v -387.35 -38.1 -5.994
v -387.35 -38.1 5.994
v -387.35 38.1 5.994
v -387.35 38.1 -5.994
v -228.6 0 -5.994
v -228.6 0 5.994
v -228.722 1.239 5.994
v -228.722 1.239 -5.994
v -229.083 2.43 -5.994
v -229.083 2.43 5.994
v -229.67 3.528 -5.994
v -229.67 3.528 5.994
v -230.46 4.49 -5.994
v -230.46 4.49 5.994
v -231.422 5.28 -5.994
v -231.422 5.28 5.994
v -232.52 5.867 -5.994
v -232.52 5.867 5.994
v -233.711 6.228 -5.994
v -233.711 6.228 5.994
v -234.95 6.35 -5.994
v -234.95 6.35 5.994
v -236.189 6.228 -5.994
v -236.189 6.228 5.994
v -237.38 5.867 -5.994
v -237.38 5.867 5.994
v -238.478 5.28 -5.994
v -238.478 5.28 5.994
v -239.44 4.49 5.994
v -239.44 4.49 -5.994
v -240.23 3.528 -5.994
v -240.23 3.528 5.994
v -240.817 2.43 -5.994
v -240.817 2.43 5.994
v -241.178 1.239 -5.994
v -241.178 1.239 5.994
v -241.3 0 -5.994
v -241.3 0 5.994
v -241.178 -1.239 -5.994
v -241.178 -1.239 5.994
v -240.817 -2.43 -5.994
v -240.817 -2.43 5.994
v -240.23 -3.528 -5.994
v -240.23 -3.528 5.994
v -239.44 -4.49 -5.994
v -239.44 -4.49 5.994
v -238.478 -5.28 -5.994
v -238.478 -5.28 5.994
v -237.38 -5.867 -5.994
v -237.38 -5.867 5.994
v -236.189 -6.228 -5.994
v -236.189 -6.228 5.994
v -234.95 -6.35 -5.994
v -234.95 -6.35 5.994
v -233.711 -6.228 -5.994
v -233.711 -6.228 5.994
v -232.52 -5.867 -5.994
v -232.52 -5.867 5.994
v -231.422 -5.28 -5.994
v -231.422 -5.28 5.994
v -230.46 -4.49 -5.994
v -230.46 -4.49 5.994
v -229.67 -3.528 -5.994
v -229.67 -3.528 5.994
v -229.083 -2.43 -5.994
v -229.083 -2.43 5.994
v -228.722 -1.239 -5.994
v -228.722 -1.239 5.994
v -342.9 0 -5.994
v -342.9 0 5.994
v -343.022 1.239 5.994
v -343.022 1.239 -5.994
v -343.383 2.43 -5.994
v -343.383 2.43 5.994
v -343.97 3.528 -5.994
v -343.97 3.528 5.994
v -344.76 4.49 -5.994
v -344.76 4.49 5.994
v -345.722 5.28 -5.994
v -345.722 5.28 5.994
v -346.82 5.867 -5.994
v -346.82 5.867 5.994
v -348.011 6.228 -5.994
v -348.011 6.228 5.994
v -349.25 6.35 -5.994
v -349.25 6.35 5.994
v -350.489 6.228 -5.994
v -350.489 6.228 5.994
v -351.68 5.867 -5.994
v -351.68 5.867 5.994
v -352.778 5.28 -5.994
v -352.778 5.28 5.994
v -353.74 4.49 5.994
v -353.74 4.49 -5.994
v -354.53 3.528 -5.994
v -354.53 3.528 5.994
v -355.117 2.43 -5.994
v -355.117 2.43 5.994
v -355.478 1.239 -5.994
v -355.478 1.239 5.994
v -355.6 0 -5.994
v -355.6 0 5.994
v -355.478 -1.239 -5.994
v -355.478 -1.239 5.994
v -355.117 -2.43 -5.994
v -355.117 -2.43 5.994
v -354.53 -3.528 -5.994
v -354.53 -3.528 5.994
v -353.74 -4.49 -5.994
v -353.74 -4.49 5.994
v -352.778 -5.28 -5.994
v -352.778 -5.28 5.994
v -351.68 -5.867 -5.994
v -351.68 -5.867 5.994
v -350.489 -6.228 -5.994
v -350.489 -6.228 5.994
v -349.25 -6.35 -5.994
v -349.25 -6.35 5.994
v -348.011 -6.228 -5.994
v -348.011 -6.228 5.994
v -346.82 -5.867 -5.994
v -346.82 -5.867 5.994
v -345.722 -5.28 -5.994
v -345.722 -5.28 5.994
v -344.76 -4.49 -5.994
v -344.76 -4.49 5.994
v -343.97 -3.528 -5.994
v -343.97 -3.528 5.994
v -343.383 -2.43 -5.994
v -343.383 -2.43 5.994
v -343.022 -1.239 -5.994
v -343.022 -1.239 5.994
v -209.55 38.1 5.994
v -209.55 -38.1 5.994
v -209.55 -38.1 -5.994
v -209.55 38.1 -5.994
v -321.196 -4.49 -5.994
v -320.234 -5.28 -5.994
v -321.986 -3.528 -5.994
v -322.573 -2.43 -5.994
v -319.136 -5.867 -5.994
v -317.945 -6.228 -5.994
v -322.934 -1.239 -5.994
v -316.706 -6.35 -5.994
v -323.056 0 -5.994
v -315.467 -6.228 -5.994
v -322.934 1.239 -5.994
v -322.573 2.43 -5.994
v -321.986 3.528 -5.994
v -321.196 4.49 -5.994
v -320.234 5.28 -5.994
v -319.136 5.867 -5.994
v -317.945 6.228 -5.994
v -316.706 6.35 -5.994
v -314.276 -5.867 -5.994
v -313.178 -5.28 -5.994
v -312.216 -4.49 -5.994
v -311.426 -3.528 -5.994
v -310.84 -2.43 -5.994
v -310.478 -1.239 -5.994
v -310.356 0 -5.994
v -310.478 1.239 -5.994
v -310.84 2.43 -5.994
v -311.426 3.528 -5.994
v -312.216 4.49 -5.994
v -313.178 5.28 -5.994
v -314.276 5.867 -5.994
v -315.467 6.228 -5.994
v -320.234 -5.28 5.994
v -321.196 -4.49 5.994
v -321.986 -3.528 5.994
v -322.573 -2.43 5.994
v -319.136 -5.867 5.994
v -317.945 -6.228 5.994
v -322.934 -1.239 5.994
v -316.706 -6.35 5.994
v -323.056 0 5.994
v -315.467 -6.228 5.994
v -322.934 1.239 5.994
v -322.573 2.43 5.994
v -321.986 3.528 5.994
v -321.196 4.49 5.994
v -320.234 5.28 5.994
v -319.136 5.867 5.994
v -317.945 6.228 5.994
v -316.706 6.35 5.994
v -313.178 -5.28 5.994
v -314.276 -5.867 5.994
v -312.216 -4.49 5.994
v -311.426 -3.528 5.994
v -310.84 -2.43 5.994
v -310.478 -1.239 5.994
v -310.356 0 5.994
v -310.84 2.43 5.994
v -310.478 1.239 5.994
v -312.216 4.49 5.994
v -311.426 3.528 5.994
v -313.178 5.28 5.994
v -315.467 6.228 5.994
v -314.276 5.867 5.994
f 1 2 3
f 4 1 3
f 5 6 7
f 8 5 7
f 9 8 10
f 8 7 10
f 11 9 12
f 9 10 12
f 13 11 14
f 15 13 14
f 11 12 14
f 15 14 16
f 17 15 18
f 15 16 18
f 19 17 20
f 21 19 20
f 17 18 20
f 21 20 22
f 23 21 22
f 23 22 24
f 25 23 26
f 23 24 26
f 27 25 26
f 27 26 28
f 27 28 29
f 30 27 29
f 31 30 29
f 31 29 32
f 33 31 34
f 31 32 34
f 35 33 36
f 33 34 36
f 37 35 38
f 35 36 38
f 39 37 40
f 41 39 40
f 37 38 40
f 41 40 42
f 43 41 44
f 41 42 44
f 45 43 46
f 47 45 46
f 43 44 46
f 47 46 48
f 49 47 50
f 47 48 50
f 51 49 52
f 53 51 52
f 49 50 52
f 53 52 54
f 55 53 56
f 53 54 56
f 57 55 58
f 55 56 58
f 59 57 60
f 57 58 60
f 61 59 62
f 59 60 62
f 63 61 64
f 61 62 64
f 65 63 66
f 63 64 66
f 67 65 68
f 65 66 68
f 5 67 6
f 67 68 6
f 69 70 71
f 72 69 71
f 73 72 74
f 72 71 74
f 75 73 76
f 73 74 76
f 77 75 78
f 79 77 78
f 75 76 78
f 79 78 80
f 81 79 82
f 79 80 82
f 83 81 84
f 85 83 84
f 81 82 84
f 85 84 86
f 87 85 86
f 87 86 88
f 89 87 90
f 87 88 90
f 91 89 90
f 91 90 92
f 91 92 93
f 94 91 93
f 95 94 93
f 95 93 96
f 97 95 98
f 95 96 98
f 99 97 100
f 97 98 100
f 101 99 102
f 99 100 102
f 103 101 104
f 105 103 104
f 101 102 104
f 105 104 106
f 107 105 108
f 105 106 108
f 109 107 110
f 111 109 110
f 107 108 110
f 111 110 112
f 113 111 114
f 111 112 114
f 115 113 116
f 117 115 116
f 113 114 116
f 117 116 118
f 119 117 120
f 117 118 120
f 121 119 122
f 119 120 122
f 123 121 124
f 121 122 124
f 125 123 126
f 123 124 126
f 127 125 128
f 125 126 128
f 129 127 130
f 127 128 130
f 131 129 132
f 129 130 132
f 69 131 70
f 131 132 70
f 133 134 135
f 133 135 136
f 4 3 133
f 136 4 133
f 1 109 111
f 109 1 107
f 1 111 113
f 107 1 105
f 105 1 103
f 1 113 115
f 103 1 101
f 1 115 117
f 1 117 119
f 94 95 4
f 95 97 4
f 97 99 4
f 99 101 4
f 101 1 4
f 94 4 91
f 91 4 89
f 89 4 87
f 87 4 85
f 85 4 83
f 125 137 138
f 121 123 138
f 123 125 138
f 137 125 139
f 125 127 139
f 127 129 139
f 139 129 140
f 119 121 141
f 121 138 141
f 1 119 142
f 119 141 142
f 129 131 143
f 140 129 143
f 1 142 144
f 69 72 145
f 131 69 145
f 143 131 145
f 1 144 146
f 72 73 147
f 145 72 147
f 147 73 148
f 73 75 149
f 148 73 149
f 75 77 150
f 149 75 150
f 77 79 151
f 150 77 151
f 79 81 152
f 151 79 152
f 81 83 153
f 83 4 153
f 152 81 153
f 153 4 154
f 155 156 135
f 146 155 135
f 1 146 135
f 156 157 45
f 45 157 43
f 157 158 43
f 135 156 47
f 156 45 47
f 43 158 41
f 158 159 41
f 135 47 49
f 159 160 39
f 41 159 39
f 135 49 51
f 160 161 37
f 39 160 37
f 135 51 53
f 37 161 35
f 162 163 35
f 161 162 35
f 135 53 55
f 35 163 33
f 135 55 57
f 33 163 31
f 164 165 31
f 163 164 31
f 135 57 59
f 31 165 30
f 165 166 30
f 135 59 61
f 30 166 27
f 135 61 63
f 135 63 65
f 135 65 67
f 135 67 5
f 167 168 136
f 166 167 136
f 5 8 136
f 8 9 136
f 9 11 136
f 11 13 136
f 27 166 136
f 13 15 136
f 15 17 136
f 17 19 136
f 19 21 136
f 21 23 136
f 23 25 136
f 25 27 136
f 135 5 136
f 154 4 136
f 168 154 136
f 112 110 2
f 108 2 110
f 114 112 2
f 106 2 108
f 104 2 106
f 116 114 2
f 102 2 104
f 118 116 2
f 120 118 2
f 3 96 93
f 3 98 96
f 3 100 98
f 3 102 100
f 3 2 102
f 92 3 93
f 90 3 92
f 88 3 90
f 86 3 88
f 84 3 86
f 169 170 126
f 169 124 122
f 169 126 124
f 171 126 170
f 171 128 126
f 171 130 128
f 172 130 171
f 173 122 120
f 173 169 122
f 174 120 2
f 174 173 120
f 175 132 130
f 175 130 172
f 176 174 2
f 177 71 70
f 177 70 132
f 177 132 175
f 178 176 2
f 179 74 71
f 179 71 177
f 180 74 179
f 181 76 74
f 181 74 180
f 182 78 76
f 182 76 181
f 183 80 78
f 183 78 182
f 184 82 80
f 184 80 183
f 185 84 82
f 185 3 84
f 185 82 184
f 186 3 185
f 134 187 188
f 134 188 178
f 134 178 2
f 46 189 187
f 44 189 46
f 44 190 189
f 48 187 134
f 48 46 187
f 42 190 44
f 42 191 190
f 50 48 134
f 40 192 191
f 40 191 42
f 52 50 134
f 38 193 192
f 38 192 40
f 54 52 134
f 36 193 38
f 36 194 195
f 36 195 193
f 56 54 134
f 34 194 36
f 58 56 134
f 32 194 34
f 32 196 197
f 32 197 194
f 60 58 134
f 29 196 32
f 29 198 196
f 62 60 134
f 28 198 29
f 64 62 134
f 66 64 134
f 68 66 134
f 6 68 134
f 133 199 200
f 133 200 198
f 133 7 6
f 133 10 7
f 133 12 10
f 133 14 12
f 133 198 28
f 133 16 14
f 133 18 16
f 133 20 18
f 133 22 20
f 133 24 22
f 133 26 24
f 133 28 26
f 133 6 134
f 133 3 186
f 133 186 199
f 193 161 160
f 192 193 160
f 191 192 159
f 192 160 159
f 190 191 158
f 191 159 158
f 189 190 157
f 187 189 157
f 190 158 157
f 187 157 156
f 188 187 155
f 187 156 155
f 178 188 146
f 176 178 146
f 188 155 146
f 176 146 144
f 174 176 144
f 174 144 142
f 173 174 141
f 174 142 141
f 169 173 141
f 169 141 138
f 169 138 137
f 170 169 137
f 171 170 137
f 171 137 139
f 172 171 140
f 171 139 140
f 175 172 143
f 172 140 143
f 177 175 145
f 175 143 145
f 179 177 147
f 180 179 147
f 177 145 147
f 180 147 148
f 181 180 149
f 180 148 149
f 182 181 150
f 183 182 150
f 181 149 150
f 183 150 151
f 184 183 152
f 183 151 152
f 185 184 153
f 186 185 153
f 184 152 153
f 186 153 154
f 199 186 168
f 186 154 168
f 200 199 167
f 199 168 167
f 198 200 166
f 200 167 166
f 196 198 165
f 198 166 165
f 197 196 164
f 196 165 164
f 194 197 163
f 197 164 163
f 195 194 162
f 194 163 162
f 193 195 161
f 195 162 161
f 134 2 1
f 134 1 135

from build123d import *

# Parameters (mm, degrees)
F0_W     = 774.7
F0_H     = 76.2
F1_DEPTH = 5.9944
F2_R     = 6.35
F3_DEPTH = 11.9888
F4_R     = 6.35
F5_DEPTH = 11.9888
F6_W     = 596.9
F6_H     = 76.2
F7_DEPTH = 11.9888


with BuildPart() as f1:
    # F0 (on Top) → F1 (new body, symmetric)
    with BuildSketch(Plane.XY):
        Rectangle(F0_W, F0_H)
    extrude(amount=F1_DEPTH, both=True)

    # F2 (on face) → F3 (cut, through all)
    with BuildSketch(Plane(origin=(0, 0, -5.9944), x_dir=(1, 0, 0), z_dir=(0, 0, -1))):
        with Locations((-316.70625, 0)):
            Circle(F2_R)
        with Locations((323.85, 0)):
            Circle(F2_R)
    extrude(amount=-F3_DEPTH, mode=Mode.SUBTRACT)

    # F4 (on face) → F5 (cut, through all)
    with BuildSketch(Plane.XY.offset(5.9944)):
        with Locations((-349.25, 0)):
            Circle(F4_R)
        with Locations((-234.95, 0)):
            Circle(F4_R)
    extrude(amount=-F5_DEPTH, mode=Mode.SUBTRACT)

    # F6 (on face) → F7 (cut, through all)
    with BuildSketch(Plane.XY.offset(5.9944)):
        with Locations((88.9, 0)):
            Rectangle(F6_W, F6_H)
    extrude(amount=-F7_DEPTH, mode=Mode.SUBTRACT)


solid = f1.part
